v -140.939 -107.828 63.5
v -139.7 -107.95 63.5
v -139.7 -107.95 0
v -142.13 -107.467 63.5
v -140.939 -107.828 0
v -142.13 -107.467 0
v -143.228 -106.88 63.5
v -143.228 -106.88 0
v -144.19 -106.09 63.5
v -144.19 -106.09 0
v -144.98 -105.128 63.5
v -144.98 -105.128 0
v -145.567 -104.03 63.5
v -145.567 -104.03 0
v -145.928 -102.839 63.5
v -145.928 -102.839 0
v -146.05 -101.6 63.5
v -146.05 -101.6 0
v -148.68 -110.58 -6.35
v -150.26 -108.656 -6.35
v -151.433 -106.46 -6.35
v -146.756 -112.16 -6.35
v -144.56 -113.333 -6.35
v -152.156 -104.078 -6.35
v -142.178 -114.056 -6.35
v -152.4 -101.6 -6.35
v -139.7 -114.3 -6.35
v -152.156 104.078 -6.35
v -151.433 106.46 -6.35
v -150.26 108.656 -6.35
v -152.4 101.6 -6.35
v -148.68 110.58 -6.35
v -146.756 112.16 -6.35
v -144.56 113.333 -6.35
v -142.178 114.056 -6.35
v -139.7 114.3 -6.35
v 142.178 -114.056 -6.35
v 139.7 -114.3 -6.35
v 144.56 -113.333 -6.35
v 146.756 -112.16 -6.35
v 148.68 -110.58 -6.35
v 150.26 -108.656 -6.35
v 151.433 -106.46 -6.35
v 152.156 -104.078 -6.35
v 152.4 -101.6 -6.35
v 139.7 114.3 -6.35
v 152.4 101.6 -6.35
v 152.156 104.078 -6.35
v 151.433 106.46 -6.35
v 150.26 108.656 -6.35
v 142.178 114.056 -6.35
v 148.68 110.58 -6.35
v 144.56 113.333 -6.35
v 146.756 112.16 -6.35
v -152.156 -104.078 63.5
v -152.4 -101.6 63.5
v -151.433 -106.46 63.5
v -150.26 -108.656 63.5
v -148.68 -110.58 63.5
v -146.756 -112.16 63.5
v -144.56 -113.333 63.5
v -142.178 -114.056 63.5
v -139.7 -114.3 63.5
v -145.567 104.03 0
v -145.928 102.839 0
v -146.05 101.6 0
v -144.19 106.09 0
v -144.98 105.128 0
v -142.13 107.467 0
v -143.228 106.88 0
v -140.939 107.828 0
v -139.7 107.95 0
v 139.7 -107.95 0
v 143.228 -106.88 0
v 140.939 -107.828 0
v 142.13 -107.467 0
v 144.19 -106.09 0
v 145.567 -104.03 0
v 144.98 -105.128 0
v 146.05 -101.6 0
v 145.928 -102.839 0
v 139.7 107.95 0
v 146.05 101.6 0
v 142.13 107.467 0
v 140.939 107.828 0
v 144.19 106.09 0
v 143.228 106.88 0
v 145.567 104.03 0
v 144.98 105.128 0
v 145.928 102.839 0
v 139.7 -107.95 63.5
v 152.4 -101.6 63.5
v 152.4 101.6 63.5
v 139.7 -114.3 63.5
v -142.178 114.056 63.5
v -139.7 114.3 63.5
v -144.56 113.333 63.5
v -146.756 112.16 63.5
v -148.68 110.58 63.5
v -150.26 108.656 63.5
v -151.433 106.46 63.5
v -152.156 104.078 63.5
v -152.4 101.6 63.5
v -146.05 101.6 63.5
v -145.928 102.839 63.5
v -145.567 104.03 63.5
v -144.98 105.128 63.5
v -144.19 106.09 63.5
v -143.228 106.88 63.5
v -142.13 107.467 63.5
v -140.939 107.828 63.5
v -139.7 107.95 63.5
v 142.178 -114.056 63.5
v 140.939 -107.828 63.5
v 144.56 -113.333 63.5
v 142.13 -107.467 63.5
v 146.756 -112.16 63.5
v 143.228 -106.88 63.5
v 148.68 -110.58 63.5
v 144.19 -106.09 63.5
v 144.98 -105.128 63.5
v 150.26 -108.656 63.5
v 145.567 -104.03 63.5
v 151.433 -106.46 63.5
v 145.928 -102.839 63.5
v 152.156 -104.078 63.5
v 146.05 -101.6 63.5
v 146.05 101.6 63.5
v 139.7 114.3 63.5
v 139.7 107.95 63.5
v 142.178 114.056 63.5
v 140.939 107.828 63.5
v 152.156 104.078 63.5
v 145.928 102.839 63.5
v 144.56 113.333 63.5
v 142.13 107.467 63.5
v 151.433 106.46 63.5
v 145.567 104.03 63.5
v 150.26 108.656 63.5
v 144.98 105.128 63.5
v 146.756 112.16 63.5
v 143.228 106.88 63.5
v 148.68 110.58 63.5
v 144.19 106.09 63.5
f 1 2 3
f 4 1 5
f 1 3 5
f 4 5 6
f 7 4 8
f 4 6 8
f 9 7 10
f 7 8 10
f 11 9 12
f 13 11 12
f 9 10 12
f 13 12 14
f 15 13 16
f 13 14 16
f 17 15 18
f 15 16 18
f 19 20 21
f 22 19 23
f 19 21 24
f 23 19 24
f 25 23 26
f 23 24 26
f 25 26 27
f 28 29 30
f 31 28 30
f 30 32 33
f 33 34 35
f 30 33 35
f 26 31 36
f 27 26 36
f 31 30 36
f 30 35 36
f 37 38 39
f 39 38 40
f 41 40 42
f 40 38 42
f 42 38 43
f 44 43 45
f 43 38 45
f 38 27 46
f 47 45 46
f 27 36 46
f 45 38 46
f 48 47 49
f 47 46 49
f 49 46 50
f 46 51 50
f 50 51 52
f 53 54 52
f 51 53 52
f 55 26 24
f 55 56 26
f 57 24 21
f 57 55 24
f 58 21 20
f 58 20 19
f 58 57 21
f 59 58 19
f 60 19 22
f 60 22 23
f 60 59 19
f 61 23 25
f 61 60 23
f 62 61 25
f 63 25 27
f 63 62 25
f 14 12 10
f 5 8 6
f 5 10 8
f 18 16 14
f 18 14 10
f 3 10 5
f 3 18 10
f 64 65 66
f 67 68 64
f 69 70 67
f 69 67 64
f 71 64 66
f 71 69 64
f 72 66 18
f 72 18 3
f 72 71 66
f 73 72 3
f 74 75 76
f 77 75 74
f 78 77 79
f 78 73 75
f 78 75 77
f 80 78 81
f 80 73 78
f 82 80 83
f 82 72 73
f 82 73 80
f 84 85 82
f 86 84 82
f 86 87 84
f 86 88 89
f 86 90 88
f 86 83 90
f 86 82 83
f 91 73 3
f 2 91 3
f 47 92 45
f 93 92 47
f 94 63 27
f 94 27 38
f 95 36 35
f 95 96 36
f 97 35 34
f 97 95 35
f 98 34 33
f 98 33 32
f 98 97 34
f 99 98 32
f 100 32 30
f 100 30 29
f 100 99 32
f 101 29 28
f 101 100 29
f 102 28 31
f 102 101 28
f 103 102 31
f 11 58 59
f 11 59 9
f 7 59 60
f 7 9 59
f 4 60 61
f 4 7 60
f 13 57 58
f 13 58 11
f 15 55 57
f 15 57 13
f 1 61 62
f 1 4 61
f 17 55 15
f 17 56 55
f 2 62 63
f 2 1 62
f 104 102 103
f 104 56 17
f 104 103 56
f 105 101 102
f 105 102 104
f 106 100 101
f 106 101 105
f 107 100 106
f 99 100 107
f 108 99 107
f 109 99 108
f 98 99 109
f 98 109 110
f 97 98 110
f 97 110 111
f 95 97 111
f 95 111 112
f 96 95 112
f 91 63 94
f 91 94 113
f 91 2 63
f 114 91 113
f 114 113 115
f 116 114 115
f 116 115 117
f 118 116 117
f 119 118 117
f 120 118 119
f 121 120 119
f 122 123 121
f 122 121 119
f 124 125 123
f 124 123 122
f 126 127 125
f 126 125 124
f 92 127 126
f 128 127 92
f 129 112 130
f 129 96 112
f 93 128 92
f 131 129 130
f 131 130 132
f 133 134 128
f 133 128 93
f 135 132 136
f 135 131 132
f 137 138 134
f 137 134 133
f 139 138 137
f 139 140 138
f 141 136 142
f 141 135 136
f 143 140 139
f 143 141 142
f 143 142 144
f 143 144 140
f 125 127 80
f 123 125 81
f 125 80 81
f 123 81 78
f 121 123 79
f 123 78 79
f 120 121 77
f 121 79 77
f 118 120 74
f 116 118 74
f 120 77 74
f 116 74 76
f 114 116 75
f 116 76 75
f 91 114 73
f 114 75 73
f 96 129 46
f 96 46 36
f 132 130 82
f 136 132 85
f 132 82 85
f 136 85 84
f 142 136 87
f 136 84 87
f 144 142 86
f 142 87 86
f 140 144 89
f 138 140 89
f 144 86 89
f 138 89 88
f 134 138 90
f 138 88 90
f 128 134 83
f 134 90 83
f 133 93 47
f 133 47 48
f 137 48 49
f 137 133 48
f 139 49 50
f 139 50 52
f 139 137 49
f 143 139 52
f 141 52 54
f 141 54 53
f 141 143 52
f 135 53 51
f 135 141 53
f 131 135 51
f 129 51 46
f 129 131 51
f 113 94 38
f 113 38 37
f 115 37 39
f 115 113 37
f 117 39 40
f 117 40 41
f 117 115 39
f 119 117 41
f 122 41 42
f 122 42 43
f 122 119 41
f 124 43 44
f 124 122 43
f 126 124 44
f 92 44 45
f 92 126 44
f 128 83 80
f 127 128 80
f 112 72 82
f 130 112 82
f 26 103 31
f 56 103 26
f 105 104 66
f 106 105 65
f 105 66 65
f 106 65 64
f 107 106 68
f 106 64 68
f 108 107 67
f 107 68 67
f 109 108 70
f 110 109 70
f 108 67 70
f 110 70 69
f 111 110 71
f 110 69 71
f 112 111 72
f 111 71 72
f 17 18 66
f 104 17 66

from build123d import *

# Parameters (mm, degrees)
F1_DEPTH = 63.5
F3_DEPTH = 6.35


with BuildPart() as f1:
    # F0 (on Top) → F1 (new body)
    with BuildSketch(Plane.XY):
        with BuildLine():
            Line((139.7, 114.3), (-139.7, 114.3))
            ThreePointArc((-139.7, 114.3), (-148.680256, 110.580256), (-152.4, 101.6))
            Line((-152.4, 101.6), (-152.4, -101.6))
            ThreePointArc((-152.4, -101.6), (-148.680256, -110.580256), (-139.7, -114.3))
            Line((-139.7, -114.3), (139.7, -114.3))
            ThreePointArc((139.7, -114.3), (148.680256, -110.580256), (152.4, -101.6))
            Line((152.4, -101.6), (152.4, 101.6))
            ThreePointArc((152.4, 101.6), (148.680256, 110.580256), (139.7, 114.3))
        make_face()
        with BuildLine():
            ThreePointArc((-146.05, 101.6), (-144.190128, 106.090128), (-139.7, 107.95))
            Line((-139.7, 107.95), (139.7, 107.95))
            ThreePointArc((139.7, 107.95), (144.190128, 106.090128), (146.05, 101.6))
            Line((146.05, 101.6), (146.05, -101.6))
            ThreePointArc((146.05, -101.6), (144.190128, -106.090128), (139.7, -107.95))
            Line((139.7, -107.95), (-139.7, -107.95))
            ThreePointArc((-139.7, -107.95), (-144.190128, -106.090128), (-146.05, -101.6))
            Line((-146.05, -101.6), (-146.05, 101.6))
        make_face(mode=Mode.SUBTRACT)
    extrude(amount=F1_DEPTH)

    # F2 (on Top) → F3 (join)
    with BuildSketch(Plane.XY):
        with BuildLine():
            ThreePointArc((-152.4, -101.6), (-148.680256, -110.580256), (-139.7, -114.3))
            Line((-139.7, -114.3), (139.7, -114.3))
            ThreePointArc((139.7, -114.3), (148.680256, -110.580256), (152.4, -101.6))
            Line((152.4, -101.6), (152.4, 101.6))
            ThreePointArc((152.4, 101.6), (148.680256, 110.580256), (139.7, 114.3))
            Line((139.7, 114.3), (-139.7, 114.3))
            ThreePointArc((-139.7, 114.3), (-148.680256, 110.580256), (-152.4, 101.6))
            Line((-152.4, 101.6), (-152.4, -101.6))
        make_face()
    extrude(amount=-F3_DEPTH)


solid = f1.part
